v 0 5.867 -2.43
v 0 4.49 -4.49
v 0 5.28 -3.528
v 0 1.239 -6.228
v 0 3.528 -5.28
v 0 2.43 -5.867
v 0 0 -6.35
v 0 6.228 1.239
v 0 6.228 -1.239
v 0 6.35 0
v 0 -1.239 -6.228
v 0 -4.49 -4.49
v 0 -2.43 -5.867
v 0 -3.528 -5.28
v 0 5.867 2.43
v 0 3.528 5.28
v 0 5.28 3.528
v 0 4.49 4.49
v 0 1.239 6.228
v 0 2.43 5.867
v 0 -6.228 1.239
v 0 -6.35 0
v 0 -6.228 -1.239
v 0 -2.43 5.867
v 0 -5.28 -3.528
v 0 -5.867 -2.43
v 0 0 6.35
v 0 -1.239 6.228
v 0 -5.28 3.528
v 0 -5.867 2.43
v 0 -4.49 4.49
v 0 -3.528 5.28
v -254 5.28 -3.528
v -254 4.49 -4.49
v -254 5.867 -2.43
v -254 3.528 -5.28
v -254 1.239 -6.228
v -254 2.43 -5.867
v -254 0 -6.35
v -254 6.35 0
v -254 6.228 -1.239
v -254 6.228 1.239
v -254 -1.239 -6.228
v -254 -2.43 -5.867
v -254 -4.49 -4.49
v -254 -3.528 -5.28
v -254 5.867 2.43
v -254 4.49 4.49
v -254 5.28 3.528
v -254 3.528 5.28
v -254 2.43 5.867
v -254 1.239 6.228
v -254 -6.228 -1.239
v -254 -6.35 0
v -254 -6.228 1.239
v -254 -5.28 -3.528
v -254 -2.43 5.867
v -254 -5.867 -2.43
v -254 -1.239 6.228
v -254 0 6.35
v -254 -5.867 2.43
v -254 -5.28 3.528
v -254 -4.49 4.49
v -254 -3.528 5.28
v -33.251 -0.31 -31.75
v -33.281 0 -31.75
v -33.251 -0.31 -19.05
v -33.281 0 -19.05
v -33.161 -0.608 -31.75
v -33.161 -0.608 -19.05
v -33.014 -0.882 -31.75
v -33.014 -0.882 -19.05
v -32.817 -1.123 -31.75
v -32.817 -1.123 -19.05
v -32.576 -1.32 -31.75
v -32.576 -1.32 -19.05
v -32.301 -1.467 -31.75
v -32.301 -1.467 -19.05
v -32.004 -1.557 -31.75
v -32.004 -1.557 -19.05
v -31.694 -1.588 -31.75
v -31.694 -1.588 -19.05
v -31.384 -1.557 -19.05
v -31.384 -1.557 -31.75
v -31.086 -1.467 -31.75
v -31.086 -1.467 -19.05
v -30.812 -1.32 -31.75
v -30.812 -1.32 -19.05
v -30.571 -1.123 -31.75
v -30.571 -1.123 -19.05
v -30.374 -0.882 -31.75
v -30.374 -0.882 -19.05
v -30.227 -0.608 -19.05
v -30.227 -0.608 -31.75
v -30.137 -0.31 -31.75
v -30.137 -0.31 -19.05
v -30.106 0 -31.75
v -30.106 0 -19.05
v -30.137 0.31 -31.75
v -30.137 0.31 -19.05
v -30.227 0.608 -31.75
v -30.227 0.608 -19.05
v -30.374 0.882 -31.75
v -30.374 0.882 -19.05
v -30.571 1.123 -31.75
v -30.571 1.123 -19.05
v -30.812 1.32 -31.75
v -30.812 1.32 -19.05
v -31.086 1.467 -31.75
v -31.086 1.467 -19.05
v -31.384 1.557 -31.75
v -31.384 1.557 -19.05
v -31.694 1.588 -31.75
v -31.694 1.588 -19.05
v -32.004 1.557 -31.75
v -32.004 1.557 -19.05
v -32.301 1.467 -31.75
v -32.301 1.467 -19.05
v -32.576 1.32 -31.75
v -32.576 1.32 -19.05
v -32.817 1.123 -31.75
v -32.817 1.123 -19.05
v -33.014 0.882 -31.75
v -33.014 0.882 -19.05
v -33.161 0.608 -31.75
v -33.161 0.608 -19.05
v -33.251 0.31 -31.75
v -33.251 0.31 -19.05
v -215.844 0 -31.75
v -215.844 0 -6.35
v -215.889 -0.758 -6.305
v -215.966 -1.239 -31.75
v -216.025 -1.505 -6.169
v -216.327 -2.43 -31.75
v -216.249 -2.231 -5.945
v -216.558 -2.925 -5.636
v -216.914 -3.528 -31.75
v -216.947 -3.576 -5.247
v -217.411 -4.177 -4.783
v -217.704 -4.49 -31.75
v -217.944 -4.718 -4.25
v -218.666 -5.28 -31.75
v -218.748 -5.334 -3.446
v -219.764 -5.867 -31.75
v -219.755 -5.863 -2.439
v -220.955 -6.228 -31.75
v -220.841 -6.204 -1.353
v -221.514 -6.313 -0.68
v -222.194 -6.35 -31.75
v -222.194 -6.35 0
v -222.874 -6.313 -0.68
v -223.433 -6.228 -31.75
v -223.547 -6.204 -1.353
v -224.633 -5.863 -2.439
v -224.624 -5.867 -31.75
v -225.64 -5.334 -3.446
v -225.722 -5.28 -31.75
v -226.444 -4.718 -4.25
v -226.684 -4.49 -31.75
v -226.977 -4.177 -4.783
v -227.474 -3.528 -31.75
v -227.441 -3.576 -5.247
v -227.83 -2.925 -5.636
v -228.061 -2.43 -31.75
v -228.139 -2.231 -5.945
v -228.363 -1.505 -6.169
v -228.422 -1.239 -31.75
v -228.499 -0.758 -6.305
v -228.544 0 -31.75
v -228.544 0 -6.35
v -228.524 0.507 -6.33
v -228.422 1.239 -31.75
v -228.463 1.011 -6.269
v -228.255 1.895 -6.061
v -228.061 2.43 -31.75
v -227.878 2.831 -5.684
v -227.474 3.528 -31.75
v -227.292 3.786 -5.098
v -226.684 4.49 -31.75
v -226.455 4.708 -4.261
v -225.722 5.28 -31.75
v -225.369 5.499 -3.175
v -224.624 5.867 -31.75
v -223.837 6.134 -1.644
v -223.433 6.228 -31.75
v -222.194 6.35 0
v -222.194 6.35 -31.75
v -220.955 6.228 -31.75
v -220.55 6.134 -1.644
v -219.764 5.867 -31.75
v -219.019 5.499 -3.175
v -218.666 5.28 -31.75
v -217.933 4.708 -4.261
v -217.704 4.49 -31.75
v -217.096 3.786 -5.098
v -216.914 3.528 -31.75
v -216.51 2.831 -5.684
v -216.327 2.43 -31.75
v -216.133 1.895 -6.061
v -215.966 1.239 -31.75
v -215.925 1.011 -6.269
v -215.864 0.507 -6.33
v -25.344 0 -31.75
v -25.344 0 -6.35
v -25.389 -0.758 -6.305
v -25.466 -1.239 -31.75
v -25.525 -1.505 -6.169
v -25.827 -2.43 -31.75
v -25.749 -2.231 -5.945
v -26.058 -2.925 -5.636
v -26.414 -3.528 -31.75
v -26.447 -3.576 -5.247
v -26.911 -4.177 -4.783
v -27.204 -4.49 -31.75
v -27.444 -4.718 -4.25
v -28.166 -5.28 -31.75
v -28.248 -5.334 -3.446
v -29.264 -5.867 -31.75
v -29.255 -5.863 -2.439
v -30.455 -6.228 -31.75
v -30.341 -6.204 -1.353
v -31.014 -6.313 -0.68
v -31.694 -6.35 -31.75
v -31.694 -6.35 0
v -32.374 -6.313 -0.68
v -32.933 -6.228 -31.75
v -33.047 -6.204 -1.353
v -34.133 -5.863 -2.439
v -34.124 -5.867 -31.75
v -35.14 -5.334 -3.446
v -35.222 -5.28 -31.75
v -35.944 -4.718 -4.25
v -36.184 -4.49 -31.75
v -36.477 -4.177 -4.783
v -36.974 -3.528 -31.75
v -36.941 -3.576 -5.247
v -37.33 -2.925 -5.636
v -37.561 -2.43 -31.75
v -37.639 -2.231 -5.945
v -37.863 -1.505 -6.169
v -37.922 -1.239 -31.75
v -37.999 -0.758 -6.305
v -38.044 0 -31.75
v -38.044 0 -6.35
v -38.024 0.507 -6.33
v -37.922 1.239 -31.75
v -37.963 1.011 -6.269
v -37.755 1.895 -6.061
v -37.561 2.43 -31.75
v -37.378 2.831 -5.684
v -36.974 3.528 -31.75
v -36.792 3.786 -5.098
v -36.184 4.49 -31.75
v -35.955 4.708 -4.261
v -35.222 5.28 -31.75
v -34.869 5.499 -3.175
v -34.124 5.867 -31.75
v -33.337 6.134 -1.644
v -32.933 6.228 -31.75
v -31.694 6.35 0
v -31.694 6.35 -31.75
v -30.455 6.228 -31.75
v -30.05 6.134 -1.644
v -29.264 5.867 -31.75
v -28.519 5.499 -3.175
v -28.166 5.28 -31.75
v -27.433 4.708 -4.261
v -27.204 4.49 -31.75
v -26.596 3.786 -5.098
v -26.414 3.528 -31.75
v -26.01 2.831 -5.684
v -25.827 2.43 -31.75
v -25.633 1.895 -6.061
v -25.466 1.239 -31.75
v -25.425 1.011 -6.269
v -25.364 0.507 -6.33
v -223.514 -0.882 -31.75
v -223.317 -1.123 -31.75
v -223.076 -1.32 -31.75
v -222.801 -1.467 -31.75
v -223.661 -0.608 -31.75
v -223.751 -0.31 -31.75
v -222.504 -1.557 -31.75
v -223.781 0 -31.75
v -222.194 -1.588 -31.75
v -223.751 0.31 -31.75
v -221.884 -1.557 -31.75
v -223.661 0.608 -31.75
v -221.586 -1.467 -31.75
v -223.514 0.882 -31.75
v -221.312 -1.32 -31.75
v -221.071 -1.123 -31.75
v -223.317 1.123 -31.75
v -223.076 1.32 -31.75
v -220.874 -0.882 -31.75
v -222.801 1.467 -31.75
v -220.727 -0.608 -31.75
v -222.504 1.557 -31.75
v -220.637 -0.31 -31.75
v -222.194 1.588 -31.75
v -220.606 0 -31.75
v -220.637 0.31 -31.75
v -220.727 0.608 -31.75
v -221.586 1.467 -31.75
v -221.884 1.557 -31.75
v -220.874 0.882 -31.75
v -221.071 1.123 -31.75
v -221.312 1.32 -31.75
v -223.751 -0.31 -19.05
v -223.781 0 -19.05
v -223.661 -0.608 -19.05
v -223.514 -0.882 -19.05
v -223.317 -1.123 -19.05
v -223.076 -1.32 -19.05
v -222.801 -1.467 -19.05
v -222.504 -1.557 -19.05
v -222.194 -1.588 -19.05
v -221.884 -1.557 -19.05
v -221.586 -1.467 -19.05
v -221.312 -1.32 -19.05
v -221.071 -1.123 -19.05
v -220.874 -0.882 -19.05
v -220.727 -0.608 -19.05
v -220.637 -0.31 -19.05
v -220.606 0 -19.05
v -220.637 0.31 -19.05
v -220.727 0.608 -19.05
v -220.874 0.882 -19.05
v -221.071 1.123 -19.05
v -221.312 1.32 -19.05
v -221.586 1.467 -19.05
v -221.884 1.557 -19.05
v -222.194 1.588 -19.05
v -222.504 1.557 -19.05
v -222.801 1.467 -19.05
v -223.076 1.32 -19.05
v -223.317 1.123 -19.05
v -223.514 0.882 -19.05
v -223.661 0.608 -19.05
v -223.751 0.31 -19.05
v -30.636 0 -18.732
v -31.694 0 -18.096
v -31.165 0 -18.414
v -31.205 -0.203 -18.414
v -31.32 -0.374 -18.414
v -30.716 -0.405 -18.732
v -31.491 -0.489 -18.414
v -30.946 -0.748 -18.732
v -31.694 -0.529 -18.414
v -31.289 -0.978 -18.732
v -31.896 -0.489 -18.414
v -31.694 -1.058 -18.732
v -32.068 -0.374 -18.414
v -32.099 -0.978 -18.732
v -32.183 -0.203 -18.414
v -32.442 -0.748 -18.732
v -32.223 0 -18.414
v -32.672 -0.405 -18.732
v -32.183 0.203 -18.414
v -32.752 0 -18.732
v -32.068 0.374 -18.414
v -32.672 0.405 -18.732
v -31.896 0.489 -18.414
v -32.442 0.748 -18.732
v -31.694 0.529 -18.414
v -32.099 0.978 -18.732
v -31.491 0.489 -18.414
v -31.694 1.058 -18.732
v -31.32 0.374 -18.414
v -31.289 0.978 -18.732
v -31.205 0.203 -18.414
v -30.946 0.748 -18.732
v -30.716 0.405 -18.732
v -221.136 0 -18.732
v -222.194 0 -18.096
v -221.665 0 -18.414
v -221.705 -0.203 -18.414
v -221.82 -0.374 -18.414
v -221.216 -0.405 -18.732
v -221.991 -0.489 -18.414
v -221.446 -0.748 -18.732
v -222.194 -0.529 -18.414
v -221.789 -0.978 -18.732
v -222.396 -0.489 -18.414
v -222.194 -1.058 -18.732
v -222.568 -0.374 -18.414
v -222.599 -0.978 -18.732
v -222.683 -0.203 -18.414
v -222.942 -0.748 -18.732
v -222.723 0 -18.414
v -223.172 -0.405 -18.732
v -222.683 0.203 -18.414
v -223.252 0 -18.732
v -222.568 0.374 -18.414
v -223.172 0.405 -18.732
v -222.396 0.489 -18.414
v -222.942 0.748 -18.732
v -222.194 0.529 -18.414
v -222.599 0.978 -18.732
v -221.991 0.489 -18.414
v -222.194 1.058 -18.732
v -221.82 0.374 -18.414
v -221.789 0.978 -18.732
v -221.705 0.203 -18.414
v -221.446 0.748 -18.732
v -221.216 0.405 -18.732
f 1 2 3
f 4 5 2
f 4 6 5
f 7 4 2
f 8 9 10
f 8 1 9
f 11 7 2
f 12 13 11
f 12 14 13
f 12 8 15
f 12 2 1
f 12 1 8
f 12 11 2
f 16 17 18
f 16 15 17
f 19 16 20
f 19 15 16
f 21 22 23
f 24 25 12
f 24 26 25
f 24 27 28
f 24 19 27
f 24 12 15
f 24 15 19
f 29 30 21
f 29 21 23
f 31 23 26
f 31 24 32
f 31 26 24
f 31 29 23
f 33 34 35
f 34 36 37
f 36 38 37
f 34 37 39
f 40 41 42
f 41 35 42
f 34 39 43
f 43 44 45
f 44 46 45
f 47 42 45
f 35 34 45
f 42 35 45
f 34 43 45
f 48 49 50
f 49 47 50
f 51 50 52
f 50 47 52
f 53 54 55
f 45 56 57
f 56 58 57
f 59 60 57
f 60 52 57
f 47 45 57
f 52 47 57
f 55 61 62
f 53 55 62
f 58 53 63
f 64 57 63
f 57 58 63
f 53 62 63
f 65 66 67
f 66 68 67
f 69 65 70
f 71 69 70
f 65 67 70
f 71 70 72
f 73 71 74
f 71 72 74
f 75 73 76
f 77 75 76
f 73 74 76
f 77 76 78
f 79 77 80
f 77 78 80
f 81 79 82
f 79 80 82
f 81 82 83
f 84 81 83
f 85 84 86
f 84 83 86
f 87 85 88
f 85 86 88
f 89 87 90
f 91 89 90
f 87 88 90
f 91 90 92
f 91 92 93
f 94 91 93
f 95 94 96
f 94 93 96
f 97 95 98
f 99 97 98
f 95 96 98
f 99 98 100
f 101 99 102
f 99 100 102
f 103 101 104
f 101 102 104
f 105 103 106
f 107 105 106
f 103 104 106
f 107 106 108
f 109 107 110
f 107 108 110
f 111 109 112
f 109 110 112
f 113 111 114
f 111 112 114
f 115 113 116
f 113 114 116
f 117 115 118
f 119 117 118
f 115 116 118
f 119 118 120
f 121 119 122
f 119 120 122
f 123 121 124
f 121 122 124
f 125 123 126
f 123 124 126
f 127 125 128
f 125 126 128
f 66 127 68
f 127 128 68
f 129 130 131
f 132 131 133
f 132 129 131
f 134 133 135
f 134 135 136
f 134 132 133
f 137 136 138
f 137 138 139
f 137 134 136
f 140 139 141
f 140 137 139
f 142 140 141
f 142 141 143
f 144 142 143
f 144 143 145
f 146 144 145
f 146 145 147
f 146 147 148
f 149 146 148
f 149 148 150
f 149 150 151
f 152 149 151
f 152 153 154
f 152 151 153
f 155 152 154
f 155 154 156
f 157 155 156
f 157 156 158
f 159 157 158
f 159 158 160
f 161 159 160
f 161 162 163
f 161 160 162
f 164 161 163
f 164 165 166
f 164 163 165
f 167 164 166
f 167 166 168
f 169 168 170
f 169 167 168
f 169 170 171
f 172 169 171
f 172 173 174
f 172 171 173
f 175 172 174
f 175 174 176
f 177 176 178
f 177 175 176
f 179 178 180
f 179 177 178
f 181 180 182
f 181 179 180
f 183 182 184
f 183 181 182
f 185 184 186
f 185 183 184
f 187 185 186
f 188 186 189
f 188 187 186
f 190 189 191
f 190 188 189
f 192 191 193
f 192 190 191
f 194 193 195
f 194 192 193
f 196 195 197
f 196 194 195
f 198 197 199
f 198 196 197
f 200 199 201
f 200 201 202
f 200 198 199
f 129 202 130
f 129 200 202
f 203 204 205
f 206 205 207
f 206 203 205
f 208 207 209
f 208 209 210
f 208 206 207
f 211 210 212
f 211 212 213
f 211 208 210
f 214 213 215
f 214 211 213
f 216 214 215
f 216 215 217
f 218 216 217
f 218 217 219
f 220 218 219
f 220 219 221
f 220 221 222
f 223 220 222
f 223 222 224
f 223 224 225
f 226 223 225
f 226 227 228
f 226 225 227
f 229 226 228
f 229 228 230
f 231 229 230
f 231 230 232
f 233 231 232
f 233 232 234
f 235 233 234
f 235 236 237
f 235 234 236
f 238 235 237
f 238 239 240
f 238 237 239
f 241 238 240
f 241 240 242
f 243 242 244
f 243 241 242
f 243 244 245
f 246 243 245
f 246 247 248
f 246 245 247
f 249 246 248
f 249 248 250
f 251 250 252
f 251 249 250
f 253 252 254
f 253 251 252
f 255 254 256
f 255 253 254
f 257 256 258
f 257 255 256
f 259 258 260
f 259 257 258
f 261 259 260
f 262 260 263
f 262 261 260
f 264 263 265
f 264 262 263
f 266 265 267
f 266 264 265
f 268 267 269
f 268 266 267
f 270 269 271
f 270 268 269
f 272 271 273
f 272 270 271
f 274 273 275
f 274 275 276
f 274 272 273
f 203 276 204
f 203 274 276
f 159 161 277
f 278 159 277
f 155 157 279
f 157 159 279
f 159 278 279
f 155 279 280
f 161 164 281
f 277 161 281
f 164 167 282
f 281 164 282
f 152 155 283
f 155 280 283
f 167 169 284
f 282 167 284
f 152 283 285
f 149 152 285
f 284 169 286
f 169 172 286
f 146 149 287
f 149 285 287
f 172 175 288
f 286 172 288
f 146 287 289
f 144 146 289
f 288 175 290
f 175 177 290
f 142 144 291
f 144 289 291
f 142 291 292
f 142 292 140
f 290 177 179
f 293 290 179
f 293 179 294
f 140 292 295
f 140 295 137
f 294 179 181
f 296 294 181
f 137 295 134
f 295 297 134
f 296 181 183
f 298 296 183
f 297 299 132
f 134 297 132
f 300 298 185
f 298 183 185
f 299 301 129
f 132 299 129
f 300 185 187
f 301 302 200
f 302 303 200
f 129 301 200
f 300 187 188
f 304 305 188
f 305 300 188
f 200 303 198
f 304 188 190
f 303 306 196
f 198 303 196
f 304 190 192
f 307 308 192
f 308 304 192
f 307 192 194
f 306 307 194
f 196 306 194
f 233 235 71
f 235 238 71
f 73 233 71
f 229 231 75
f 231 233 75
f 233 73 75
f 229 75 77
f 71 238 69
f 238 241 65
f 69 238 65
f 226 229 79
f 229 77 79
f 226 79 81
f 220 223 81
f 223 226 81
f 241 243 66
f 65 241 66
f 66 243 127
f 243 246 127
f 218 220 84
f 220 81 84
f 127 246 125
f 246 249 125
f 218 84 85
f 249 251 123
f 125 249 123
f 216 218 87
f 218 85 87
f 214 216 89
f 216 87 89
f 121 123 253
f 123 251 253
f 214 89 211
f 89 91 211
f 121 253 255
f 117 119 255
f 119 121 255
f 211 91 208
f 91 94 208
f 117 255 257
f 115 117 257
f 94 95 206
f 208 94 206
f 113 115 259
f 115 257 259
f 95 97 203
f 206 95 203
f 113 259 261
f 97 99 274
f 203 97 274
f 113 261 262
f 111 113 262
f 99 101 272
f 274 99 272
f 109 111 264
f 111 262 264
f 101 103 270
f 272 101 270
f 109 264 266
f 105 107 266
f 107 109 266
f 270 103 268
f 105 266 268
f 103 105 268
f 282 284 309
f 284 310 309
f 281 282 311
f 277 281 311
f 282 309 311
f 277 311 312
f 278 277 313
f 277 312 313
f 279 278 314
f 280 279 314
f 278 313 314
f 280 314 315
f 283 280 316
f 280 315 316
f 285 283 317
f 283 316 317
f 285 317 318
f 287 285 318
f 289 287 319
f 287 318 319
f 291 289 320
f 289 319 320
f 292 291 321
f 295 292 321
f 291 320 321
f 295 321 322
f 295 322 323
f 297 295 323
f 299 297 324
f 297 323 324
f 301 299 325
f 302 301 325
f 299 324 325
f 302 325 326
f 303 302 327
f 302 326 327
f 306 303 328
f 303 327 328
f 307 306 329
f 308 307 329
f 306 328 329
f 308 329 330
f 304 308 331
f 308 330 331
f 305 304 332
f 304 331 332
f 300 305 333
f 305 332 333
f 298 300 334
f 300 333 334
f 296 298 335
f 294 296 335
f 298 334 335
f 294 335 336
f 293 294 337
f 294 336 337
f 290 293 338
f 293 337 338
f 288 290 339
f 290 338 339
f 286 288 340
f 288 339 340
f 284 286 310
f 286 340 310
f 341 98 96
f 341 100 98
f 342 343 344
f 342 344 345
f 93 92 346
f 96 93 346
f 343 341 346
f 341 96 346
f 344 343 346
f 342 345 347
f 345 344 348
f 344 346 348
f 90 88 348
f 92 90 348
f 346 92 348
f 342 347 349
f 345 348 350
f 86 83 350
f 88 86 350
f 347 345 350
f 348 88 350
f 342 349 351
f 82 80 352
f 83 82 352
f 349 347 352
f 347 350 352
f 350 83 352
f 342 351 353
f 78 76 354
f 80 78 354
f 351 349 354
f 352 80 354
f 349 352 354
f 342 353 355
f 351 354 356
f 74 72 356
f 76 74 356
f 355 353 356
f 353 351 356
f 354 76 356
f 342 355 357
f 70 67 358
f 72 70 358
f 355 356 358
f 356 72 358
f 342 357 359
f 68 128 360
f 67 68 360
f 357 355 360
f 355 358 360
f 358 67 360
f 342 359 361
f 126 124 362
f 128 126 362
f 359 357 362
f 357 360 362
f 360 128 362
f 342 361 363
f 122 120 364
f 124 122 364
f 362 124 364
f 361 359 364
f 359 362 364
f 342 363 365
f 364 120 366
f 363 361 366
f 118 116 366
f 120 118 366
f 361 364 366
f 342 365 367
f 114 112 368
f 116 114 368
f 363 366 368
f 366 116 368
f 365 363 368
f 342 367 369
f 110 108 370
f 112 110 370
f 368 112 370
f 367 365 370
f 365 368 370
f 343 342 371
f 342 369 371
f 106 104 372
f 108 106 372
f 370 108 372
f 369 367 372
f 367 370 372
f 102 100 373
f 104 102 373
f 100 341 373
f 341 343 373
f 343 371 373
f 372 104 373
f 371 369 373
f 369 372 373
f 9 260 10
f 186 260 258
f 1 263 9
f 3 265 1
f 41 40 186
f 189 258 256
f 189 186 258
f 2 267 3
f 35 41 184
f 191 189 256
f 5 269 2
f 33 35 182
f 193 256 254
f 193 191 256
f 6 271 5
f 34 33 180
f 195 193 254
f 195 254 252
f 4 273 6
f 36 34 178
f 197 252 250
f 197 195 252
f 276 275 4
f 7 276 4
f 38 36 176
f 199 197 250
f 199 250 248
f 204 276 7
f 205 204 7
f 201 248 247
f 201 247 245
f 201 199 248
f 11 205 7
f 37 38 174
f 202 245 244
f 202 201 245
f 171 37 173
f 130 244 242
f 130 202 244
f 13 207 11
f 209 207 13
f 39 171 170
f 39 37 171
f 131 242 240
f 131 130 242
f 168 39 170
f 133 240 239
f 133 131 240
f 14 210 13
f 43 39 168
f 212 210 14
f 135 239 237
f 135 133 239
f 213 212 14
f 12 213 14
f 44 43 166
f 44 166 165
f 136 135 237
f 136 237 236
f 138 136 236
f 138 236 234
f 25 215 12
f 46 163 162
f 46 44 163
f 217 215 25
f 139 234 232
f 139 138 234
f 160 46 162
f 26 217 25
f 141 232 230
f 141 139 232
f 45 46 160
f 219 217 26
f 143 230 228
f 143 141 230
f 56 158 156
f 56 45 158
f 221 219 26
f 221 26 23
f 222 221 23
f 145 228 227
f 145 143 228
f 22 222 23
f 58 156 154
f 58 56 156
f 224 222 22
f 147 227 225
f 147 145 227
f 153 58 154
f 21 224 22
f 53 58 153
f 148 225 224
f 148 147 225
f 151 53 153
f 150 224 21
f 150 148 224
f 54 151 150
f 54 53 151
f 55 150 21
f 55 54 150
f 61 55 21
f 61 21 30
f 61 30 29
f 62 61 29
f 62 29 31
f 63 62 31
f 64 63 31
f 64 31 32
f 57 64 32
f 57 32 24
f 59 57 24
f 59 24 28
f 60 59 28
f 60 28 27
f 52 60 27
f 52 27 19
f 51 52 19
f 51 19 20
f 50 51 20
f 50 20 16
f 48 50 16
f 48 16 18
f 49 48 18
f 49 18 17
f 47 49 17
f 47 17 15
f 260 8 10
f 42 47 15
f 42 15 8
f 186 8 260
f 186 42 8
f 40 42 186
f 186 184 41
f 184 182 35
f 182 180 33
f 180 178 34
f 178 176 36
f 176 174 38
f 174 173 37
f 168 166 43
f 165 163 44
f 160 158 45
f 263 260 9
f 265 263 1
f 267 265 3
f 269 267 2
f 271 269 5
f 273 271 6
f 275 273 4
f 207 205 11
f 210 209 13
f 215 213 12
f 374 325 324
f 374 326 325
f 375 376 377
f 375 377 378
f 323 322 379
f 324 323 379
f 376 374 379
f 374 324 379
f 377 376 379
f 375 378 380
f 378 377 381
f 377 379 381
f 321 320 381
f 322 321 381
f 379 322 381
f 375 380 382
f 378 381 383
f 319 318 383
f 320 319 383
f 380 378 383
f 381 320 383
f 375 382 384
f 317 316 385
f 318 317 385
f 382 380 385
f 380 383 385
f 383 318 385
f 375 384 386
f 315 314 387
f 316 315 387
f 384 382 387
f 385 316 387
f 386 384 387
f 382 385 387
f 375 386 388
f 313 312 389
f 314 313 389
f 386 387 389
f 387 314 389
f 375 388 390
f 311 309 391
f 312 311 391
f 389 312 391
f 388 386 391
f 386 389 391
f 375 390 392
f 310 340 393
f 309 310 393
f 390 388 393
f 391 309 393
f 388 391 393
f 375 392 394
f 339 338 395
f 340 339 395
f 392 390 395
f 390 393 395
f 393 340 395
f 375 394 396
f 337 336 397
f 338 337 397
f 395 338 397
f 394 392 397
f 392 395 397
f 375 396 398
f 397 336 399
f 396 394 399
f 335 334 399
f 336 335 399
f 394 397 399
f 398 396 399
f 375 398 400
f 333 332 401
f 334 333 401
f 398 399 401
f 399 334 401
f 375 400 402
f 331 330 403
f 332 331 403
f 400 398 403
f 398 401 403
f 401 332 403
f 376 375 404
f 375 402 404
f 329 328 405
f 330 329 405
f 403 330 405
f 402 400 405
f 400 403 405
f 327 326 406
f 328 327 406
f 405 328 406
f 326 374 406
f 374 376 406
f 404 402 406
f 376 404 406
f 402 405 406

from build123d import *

# Parameters (mm, degrees)
F1_R     = 6.35
F3_R     = 6.35
F6_D     = 3.175
F6_DEPTH = 12.7
F6_TIP   = 0.9538662327


with BuildPart() as f2:
    # F2: sweep along a path in F0
    with BuildLine(Plane.XZ) as f2_path:
        Line((0, 0), (-254, 0))
    # F1 (on Right) → F2 (sweep)
    with BuildSketch(Plane.YZ):
        Circle(F1_R)
    sweep(path=f2_path.line)

    # F4: sweep along a path in F0
    with BuildLine(Plane.XZ) as f4_path:
        Line((-222.25, 0), (-222.25, -31.75))
    # F3 (on Top) → F4 (sweep)
    with BuildSketch(Plane.XY):
        with Locations((-222.1939712763, 0)):
            Circle(F3_R)
        with Locations((-31.6939712763, 0)):
            Circle(F3_R)
    sweep(path=f4_path.line)

    # F6
    with Locations(Plane(origin=(0, 0, -31.75), x_dir=(1, 0, 0), z_dir=(0, 0, -1))):
        with Locations((-222.1939712763, 0), (-31.6939712763, 0)):
            Hole(F6_D / 2, depth=F6_DEPTH)
            with Locations((0, 0, -(F6_DEPTH + F6_TIP / 2))):  # 118° drill point
                Cone(0, F6_D / 2, F6_TIP, mode=Mode.SUBTRACT)


solid = f2.part
